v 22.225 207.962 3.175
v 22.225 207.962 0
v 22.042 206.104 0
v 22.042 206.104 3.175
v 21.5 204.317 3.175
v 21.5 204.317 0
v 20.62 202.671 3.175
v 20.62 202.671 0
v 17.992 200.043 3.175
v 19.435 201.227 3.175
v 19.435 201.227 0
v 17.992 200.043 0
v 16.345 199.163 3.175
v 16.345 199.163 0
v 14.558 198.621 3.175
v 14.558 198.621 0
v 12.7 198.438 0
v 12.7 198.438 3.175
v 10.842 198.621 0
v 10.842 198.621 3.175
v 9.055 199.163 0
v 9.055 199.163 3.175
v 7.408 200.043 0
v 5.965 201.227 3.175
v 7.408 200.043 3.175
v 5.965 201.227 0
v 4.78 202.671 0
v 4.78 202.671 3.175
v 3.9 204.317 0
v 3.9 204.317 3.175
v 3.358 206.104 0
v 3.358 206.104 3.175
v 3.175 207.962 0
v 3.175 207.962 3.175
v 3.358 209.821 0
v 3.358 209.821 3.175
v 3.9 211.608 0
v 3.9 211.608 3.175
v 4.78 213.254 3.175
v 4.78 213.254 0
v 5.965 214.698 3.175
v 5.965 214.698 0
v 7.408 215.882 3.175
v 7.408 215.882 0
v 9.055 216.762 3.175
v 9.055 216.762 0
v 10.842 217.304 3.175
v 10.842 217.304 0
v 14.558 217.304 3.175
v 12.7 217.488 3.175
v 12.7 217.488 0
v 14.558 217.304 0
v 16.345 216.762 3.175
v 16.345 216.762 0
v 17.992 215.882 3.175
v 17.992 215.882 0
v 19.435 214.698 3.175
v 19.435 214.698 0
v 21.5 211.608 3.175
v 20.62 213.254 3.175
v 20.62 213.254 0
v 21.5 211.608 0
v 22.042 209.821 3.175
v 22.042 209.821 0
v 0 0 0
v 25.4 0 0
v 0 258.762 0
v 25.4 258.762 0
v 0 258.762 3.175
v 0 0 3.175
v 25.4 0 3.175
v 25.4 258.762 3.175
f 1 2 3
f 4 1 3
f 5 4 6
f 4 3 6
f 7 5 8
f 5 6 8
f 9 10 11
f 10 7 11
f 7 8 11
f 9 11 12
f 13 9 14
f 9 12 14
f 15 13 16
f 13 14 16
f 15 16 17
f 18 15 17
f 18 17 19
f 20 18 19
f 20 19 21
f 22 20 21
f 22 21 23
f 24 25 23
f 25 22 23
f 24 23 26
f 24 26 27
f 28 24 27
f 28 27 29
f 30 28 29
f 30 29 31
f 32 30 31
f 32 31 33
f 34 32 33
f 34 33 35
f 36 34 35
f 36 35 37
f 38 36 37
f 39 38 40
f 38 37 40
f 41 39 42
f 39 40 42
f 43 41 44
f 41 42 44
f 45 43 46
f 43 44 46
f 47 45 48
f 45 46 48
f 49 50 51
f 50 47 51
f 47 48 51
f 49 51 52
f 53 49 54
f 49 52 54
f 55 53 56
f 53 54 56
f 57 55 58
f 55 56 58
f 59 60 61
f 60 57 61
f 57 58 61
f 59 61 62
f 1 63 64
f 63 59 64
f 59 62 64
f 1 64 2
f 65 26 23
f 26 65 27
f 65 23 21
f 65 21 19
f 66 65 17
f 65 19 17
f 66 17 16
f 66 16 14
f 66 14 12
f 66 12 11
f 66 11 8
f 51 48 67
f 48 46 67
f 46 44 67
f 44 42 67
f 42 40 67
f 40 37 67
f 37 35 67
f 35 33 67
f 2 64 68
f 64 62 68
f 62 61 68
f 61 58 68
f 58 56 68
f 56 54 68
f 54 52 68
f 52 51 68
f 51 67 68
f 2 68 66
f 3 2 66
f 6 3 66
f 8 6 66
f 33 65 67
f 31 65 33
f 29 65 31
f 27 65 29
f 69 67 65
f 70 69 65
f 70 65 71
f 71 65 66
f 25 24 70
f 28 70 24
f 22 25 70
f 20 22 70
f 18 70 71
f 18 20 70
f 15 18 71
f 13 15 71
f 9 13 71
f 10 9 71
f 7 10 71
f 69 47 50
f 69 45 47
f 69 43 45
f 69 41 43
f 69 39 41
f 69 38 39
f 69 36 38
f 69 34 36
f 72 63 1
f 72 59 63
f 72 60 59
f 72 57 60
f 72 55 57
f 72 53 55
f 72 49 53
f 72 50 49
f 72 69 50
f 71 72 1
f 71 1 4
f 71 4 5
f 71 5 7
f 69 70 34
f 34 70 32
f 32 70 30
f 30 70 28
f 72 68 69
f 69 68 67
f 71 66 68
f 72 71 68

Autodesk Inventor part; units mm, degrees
ref_plane "YZ Plane" through (0, 0, 0) normal (1, 0, 0) x (0, 1, 0)
ref_plane "XZ Plane" through (0, 0, 0) normal (0, 1, 0) x (-1, 0, 0)
ref_plane "XY Plane" through (0, 0, 0) normal (0, 0, 1) x (1, 0, 0)
sketch "Sketch1" plane through (0, 0, 0) normal (0, 0, 1) x (1, 0, 0)
  line L0 (0, 0) -> (25.4, 0)
  line L1 (25.4, 0) -> (25.4, 258.7625)
  line L2 (25.4, 258.7625) -> (0, 258.7625)
  line L3 (0, 258.7625) -> (0, 0)
  line L4 (12.7, 0) -> (12.7, 207.9625) construction
  circle A0 centre (12.7, 207.9625) radius 9.525
  dimension "d0" = 25.4
  dimension "d1" = 258.7625
  dimension "d2" = 207.9625
  dimension "d3" = 19.05
extrude "Extrusion1" add sketch "Sketch1" along normal blind 3.175
properties part number "wall"
